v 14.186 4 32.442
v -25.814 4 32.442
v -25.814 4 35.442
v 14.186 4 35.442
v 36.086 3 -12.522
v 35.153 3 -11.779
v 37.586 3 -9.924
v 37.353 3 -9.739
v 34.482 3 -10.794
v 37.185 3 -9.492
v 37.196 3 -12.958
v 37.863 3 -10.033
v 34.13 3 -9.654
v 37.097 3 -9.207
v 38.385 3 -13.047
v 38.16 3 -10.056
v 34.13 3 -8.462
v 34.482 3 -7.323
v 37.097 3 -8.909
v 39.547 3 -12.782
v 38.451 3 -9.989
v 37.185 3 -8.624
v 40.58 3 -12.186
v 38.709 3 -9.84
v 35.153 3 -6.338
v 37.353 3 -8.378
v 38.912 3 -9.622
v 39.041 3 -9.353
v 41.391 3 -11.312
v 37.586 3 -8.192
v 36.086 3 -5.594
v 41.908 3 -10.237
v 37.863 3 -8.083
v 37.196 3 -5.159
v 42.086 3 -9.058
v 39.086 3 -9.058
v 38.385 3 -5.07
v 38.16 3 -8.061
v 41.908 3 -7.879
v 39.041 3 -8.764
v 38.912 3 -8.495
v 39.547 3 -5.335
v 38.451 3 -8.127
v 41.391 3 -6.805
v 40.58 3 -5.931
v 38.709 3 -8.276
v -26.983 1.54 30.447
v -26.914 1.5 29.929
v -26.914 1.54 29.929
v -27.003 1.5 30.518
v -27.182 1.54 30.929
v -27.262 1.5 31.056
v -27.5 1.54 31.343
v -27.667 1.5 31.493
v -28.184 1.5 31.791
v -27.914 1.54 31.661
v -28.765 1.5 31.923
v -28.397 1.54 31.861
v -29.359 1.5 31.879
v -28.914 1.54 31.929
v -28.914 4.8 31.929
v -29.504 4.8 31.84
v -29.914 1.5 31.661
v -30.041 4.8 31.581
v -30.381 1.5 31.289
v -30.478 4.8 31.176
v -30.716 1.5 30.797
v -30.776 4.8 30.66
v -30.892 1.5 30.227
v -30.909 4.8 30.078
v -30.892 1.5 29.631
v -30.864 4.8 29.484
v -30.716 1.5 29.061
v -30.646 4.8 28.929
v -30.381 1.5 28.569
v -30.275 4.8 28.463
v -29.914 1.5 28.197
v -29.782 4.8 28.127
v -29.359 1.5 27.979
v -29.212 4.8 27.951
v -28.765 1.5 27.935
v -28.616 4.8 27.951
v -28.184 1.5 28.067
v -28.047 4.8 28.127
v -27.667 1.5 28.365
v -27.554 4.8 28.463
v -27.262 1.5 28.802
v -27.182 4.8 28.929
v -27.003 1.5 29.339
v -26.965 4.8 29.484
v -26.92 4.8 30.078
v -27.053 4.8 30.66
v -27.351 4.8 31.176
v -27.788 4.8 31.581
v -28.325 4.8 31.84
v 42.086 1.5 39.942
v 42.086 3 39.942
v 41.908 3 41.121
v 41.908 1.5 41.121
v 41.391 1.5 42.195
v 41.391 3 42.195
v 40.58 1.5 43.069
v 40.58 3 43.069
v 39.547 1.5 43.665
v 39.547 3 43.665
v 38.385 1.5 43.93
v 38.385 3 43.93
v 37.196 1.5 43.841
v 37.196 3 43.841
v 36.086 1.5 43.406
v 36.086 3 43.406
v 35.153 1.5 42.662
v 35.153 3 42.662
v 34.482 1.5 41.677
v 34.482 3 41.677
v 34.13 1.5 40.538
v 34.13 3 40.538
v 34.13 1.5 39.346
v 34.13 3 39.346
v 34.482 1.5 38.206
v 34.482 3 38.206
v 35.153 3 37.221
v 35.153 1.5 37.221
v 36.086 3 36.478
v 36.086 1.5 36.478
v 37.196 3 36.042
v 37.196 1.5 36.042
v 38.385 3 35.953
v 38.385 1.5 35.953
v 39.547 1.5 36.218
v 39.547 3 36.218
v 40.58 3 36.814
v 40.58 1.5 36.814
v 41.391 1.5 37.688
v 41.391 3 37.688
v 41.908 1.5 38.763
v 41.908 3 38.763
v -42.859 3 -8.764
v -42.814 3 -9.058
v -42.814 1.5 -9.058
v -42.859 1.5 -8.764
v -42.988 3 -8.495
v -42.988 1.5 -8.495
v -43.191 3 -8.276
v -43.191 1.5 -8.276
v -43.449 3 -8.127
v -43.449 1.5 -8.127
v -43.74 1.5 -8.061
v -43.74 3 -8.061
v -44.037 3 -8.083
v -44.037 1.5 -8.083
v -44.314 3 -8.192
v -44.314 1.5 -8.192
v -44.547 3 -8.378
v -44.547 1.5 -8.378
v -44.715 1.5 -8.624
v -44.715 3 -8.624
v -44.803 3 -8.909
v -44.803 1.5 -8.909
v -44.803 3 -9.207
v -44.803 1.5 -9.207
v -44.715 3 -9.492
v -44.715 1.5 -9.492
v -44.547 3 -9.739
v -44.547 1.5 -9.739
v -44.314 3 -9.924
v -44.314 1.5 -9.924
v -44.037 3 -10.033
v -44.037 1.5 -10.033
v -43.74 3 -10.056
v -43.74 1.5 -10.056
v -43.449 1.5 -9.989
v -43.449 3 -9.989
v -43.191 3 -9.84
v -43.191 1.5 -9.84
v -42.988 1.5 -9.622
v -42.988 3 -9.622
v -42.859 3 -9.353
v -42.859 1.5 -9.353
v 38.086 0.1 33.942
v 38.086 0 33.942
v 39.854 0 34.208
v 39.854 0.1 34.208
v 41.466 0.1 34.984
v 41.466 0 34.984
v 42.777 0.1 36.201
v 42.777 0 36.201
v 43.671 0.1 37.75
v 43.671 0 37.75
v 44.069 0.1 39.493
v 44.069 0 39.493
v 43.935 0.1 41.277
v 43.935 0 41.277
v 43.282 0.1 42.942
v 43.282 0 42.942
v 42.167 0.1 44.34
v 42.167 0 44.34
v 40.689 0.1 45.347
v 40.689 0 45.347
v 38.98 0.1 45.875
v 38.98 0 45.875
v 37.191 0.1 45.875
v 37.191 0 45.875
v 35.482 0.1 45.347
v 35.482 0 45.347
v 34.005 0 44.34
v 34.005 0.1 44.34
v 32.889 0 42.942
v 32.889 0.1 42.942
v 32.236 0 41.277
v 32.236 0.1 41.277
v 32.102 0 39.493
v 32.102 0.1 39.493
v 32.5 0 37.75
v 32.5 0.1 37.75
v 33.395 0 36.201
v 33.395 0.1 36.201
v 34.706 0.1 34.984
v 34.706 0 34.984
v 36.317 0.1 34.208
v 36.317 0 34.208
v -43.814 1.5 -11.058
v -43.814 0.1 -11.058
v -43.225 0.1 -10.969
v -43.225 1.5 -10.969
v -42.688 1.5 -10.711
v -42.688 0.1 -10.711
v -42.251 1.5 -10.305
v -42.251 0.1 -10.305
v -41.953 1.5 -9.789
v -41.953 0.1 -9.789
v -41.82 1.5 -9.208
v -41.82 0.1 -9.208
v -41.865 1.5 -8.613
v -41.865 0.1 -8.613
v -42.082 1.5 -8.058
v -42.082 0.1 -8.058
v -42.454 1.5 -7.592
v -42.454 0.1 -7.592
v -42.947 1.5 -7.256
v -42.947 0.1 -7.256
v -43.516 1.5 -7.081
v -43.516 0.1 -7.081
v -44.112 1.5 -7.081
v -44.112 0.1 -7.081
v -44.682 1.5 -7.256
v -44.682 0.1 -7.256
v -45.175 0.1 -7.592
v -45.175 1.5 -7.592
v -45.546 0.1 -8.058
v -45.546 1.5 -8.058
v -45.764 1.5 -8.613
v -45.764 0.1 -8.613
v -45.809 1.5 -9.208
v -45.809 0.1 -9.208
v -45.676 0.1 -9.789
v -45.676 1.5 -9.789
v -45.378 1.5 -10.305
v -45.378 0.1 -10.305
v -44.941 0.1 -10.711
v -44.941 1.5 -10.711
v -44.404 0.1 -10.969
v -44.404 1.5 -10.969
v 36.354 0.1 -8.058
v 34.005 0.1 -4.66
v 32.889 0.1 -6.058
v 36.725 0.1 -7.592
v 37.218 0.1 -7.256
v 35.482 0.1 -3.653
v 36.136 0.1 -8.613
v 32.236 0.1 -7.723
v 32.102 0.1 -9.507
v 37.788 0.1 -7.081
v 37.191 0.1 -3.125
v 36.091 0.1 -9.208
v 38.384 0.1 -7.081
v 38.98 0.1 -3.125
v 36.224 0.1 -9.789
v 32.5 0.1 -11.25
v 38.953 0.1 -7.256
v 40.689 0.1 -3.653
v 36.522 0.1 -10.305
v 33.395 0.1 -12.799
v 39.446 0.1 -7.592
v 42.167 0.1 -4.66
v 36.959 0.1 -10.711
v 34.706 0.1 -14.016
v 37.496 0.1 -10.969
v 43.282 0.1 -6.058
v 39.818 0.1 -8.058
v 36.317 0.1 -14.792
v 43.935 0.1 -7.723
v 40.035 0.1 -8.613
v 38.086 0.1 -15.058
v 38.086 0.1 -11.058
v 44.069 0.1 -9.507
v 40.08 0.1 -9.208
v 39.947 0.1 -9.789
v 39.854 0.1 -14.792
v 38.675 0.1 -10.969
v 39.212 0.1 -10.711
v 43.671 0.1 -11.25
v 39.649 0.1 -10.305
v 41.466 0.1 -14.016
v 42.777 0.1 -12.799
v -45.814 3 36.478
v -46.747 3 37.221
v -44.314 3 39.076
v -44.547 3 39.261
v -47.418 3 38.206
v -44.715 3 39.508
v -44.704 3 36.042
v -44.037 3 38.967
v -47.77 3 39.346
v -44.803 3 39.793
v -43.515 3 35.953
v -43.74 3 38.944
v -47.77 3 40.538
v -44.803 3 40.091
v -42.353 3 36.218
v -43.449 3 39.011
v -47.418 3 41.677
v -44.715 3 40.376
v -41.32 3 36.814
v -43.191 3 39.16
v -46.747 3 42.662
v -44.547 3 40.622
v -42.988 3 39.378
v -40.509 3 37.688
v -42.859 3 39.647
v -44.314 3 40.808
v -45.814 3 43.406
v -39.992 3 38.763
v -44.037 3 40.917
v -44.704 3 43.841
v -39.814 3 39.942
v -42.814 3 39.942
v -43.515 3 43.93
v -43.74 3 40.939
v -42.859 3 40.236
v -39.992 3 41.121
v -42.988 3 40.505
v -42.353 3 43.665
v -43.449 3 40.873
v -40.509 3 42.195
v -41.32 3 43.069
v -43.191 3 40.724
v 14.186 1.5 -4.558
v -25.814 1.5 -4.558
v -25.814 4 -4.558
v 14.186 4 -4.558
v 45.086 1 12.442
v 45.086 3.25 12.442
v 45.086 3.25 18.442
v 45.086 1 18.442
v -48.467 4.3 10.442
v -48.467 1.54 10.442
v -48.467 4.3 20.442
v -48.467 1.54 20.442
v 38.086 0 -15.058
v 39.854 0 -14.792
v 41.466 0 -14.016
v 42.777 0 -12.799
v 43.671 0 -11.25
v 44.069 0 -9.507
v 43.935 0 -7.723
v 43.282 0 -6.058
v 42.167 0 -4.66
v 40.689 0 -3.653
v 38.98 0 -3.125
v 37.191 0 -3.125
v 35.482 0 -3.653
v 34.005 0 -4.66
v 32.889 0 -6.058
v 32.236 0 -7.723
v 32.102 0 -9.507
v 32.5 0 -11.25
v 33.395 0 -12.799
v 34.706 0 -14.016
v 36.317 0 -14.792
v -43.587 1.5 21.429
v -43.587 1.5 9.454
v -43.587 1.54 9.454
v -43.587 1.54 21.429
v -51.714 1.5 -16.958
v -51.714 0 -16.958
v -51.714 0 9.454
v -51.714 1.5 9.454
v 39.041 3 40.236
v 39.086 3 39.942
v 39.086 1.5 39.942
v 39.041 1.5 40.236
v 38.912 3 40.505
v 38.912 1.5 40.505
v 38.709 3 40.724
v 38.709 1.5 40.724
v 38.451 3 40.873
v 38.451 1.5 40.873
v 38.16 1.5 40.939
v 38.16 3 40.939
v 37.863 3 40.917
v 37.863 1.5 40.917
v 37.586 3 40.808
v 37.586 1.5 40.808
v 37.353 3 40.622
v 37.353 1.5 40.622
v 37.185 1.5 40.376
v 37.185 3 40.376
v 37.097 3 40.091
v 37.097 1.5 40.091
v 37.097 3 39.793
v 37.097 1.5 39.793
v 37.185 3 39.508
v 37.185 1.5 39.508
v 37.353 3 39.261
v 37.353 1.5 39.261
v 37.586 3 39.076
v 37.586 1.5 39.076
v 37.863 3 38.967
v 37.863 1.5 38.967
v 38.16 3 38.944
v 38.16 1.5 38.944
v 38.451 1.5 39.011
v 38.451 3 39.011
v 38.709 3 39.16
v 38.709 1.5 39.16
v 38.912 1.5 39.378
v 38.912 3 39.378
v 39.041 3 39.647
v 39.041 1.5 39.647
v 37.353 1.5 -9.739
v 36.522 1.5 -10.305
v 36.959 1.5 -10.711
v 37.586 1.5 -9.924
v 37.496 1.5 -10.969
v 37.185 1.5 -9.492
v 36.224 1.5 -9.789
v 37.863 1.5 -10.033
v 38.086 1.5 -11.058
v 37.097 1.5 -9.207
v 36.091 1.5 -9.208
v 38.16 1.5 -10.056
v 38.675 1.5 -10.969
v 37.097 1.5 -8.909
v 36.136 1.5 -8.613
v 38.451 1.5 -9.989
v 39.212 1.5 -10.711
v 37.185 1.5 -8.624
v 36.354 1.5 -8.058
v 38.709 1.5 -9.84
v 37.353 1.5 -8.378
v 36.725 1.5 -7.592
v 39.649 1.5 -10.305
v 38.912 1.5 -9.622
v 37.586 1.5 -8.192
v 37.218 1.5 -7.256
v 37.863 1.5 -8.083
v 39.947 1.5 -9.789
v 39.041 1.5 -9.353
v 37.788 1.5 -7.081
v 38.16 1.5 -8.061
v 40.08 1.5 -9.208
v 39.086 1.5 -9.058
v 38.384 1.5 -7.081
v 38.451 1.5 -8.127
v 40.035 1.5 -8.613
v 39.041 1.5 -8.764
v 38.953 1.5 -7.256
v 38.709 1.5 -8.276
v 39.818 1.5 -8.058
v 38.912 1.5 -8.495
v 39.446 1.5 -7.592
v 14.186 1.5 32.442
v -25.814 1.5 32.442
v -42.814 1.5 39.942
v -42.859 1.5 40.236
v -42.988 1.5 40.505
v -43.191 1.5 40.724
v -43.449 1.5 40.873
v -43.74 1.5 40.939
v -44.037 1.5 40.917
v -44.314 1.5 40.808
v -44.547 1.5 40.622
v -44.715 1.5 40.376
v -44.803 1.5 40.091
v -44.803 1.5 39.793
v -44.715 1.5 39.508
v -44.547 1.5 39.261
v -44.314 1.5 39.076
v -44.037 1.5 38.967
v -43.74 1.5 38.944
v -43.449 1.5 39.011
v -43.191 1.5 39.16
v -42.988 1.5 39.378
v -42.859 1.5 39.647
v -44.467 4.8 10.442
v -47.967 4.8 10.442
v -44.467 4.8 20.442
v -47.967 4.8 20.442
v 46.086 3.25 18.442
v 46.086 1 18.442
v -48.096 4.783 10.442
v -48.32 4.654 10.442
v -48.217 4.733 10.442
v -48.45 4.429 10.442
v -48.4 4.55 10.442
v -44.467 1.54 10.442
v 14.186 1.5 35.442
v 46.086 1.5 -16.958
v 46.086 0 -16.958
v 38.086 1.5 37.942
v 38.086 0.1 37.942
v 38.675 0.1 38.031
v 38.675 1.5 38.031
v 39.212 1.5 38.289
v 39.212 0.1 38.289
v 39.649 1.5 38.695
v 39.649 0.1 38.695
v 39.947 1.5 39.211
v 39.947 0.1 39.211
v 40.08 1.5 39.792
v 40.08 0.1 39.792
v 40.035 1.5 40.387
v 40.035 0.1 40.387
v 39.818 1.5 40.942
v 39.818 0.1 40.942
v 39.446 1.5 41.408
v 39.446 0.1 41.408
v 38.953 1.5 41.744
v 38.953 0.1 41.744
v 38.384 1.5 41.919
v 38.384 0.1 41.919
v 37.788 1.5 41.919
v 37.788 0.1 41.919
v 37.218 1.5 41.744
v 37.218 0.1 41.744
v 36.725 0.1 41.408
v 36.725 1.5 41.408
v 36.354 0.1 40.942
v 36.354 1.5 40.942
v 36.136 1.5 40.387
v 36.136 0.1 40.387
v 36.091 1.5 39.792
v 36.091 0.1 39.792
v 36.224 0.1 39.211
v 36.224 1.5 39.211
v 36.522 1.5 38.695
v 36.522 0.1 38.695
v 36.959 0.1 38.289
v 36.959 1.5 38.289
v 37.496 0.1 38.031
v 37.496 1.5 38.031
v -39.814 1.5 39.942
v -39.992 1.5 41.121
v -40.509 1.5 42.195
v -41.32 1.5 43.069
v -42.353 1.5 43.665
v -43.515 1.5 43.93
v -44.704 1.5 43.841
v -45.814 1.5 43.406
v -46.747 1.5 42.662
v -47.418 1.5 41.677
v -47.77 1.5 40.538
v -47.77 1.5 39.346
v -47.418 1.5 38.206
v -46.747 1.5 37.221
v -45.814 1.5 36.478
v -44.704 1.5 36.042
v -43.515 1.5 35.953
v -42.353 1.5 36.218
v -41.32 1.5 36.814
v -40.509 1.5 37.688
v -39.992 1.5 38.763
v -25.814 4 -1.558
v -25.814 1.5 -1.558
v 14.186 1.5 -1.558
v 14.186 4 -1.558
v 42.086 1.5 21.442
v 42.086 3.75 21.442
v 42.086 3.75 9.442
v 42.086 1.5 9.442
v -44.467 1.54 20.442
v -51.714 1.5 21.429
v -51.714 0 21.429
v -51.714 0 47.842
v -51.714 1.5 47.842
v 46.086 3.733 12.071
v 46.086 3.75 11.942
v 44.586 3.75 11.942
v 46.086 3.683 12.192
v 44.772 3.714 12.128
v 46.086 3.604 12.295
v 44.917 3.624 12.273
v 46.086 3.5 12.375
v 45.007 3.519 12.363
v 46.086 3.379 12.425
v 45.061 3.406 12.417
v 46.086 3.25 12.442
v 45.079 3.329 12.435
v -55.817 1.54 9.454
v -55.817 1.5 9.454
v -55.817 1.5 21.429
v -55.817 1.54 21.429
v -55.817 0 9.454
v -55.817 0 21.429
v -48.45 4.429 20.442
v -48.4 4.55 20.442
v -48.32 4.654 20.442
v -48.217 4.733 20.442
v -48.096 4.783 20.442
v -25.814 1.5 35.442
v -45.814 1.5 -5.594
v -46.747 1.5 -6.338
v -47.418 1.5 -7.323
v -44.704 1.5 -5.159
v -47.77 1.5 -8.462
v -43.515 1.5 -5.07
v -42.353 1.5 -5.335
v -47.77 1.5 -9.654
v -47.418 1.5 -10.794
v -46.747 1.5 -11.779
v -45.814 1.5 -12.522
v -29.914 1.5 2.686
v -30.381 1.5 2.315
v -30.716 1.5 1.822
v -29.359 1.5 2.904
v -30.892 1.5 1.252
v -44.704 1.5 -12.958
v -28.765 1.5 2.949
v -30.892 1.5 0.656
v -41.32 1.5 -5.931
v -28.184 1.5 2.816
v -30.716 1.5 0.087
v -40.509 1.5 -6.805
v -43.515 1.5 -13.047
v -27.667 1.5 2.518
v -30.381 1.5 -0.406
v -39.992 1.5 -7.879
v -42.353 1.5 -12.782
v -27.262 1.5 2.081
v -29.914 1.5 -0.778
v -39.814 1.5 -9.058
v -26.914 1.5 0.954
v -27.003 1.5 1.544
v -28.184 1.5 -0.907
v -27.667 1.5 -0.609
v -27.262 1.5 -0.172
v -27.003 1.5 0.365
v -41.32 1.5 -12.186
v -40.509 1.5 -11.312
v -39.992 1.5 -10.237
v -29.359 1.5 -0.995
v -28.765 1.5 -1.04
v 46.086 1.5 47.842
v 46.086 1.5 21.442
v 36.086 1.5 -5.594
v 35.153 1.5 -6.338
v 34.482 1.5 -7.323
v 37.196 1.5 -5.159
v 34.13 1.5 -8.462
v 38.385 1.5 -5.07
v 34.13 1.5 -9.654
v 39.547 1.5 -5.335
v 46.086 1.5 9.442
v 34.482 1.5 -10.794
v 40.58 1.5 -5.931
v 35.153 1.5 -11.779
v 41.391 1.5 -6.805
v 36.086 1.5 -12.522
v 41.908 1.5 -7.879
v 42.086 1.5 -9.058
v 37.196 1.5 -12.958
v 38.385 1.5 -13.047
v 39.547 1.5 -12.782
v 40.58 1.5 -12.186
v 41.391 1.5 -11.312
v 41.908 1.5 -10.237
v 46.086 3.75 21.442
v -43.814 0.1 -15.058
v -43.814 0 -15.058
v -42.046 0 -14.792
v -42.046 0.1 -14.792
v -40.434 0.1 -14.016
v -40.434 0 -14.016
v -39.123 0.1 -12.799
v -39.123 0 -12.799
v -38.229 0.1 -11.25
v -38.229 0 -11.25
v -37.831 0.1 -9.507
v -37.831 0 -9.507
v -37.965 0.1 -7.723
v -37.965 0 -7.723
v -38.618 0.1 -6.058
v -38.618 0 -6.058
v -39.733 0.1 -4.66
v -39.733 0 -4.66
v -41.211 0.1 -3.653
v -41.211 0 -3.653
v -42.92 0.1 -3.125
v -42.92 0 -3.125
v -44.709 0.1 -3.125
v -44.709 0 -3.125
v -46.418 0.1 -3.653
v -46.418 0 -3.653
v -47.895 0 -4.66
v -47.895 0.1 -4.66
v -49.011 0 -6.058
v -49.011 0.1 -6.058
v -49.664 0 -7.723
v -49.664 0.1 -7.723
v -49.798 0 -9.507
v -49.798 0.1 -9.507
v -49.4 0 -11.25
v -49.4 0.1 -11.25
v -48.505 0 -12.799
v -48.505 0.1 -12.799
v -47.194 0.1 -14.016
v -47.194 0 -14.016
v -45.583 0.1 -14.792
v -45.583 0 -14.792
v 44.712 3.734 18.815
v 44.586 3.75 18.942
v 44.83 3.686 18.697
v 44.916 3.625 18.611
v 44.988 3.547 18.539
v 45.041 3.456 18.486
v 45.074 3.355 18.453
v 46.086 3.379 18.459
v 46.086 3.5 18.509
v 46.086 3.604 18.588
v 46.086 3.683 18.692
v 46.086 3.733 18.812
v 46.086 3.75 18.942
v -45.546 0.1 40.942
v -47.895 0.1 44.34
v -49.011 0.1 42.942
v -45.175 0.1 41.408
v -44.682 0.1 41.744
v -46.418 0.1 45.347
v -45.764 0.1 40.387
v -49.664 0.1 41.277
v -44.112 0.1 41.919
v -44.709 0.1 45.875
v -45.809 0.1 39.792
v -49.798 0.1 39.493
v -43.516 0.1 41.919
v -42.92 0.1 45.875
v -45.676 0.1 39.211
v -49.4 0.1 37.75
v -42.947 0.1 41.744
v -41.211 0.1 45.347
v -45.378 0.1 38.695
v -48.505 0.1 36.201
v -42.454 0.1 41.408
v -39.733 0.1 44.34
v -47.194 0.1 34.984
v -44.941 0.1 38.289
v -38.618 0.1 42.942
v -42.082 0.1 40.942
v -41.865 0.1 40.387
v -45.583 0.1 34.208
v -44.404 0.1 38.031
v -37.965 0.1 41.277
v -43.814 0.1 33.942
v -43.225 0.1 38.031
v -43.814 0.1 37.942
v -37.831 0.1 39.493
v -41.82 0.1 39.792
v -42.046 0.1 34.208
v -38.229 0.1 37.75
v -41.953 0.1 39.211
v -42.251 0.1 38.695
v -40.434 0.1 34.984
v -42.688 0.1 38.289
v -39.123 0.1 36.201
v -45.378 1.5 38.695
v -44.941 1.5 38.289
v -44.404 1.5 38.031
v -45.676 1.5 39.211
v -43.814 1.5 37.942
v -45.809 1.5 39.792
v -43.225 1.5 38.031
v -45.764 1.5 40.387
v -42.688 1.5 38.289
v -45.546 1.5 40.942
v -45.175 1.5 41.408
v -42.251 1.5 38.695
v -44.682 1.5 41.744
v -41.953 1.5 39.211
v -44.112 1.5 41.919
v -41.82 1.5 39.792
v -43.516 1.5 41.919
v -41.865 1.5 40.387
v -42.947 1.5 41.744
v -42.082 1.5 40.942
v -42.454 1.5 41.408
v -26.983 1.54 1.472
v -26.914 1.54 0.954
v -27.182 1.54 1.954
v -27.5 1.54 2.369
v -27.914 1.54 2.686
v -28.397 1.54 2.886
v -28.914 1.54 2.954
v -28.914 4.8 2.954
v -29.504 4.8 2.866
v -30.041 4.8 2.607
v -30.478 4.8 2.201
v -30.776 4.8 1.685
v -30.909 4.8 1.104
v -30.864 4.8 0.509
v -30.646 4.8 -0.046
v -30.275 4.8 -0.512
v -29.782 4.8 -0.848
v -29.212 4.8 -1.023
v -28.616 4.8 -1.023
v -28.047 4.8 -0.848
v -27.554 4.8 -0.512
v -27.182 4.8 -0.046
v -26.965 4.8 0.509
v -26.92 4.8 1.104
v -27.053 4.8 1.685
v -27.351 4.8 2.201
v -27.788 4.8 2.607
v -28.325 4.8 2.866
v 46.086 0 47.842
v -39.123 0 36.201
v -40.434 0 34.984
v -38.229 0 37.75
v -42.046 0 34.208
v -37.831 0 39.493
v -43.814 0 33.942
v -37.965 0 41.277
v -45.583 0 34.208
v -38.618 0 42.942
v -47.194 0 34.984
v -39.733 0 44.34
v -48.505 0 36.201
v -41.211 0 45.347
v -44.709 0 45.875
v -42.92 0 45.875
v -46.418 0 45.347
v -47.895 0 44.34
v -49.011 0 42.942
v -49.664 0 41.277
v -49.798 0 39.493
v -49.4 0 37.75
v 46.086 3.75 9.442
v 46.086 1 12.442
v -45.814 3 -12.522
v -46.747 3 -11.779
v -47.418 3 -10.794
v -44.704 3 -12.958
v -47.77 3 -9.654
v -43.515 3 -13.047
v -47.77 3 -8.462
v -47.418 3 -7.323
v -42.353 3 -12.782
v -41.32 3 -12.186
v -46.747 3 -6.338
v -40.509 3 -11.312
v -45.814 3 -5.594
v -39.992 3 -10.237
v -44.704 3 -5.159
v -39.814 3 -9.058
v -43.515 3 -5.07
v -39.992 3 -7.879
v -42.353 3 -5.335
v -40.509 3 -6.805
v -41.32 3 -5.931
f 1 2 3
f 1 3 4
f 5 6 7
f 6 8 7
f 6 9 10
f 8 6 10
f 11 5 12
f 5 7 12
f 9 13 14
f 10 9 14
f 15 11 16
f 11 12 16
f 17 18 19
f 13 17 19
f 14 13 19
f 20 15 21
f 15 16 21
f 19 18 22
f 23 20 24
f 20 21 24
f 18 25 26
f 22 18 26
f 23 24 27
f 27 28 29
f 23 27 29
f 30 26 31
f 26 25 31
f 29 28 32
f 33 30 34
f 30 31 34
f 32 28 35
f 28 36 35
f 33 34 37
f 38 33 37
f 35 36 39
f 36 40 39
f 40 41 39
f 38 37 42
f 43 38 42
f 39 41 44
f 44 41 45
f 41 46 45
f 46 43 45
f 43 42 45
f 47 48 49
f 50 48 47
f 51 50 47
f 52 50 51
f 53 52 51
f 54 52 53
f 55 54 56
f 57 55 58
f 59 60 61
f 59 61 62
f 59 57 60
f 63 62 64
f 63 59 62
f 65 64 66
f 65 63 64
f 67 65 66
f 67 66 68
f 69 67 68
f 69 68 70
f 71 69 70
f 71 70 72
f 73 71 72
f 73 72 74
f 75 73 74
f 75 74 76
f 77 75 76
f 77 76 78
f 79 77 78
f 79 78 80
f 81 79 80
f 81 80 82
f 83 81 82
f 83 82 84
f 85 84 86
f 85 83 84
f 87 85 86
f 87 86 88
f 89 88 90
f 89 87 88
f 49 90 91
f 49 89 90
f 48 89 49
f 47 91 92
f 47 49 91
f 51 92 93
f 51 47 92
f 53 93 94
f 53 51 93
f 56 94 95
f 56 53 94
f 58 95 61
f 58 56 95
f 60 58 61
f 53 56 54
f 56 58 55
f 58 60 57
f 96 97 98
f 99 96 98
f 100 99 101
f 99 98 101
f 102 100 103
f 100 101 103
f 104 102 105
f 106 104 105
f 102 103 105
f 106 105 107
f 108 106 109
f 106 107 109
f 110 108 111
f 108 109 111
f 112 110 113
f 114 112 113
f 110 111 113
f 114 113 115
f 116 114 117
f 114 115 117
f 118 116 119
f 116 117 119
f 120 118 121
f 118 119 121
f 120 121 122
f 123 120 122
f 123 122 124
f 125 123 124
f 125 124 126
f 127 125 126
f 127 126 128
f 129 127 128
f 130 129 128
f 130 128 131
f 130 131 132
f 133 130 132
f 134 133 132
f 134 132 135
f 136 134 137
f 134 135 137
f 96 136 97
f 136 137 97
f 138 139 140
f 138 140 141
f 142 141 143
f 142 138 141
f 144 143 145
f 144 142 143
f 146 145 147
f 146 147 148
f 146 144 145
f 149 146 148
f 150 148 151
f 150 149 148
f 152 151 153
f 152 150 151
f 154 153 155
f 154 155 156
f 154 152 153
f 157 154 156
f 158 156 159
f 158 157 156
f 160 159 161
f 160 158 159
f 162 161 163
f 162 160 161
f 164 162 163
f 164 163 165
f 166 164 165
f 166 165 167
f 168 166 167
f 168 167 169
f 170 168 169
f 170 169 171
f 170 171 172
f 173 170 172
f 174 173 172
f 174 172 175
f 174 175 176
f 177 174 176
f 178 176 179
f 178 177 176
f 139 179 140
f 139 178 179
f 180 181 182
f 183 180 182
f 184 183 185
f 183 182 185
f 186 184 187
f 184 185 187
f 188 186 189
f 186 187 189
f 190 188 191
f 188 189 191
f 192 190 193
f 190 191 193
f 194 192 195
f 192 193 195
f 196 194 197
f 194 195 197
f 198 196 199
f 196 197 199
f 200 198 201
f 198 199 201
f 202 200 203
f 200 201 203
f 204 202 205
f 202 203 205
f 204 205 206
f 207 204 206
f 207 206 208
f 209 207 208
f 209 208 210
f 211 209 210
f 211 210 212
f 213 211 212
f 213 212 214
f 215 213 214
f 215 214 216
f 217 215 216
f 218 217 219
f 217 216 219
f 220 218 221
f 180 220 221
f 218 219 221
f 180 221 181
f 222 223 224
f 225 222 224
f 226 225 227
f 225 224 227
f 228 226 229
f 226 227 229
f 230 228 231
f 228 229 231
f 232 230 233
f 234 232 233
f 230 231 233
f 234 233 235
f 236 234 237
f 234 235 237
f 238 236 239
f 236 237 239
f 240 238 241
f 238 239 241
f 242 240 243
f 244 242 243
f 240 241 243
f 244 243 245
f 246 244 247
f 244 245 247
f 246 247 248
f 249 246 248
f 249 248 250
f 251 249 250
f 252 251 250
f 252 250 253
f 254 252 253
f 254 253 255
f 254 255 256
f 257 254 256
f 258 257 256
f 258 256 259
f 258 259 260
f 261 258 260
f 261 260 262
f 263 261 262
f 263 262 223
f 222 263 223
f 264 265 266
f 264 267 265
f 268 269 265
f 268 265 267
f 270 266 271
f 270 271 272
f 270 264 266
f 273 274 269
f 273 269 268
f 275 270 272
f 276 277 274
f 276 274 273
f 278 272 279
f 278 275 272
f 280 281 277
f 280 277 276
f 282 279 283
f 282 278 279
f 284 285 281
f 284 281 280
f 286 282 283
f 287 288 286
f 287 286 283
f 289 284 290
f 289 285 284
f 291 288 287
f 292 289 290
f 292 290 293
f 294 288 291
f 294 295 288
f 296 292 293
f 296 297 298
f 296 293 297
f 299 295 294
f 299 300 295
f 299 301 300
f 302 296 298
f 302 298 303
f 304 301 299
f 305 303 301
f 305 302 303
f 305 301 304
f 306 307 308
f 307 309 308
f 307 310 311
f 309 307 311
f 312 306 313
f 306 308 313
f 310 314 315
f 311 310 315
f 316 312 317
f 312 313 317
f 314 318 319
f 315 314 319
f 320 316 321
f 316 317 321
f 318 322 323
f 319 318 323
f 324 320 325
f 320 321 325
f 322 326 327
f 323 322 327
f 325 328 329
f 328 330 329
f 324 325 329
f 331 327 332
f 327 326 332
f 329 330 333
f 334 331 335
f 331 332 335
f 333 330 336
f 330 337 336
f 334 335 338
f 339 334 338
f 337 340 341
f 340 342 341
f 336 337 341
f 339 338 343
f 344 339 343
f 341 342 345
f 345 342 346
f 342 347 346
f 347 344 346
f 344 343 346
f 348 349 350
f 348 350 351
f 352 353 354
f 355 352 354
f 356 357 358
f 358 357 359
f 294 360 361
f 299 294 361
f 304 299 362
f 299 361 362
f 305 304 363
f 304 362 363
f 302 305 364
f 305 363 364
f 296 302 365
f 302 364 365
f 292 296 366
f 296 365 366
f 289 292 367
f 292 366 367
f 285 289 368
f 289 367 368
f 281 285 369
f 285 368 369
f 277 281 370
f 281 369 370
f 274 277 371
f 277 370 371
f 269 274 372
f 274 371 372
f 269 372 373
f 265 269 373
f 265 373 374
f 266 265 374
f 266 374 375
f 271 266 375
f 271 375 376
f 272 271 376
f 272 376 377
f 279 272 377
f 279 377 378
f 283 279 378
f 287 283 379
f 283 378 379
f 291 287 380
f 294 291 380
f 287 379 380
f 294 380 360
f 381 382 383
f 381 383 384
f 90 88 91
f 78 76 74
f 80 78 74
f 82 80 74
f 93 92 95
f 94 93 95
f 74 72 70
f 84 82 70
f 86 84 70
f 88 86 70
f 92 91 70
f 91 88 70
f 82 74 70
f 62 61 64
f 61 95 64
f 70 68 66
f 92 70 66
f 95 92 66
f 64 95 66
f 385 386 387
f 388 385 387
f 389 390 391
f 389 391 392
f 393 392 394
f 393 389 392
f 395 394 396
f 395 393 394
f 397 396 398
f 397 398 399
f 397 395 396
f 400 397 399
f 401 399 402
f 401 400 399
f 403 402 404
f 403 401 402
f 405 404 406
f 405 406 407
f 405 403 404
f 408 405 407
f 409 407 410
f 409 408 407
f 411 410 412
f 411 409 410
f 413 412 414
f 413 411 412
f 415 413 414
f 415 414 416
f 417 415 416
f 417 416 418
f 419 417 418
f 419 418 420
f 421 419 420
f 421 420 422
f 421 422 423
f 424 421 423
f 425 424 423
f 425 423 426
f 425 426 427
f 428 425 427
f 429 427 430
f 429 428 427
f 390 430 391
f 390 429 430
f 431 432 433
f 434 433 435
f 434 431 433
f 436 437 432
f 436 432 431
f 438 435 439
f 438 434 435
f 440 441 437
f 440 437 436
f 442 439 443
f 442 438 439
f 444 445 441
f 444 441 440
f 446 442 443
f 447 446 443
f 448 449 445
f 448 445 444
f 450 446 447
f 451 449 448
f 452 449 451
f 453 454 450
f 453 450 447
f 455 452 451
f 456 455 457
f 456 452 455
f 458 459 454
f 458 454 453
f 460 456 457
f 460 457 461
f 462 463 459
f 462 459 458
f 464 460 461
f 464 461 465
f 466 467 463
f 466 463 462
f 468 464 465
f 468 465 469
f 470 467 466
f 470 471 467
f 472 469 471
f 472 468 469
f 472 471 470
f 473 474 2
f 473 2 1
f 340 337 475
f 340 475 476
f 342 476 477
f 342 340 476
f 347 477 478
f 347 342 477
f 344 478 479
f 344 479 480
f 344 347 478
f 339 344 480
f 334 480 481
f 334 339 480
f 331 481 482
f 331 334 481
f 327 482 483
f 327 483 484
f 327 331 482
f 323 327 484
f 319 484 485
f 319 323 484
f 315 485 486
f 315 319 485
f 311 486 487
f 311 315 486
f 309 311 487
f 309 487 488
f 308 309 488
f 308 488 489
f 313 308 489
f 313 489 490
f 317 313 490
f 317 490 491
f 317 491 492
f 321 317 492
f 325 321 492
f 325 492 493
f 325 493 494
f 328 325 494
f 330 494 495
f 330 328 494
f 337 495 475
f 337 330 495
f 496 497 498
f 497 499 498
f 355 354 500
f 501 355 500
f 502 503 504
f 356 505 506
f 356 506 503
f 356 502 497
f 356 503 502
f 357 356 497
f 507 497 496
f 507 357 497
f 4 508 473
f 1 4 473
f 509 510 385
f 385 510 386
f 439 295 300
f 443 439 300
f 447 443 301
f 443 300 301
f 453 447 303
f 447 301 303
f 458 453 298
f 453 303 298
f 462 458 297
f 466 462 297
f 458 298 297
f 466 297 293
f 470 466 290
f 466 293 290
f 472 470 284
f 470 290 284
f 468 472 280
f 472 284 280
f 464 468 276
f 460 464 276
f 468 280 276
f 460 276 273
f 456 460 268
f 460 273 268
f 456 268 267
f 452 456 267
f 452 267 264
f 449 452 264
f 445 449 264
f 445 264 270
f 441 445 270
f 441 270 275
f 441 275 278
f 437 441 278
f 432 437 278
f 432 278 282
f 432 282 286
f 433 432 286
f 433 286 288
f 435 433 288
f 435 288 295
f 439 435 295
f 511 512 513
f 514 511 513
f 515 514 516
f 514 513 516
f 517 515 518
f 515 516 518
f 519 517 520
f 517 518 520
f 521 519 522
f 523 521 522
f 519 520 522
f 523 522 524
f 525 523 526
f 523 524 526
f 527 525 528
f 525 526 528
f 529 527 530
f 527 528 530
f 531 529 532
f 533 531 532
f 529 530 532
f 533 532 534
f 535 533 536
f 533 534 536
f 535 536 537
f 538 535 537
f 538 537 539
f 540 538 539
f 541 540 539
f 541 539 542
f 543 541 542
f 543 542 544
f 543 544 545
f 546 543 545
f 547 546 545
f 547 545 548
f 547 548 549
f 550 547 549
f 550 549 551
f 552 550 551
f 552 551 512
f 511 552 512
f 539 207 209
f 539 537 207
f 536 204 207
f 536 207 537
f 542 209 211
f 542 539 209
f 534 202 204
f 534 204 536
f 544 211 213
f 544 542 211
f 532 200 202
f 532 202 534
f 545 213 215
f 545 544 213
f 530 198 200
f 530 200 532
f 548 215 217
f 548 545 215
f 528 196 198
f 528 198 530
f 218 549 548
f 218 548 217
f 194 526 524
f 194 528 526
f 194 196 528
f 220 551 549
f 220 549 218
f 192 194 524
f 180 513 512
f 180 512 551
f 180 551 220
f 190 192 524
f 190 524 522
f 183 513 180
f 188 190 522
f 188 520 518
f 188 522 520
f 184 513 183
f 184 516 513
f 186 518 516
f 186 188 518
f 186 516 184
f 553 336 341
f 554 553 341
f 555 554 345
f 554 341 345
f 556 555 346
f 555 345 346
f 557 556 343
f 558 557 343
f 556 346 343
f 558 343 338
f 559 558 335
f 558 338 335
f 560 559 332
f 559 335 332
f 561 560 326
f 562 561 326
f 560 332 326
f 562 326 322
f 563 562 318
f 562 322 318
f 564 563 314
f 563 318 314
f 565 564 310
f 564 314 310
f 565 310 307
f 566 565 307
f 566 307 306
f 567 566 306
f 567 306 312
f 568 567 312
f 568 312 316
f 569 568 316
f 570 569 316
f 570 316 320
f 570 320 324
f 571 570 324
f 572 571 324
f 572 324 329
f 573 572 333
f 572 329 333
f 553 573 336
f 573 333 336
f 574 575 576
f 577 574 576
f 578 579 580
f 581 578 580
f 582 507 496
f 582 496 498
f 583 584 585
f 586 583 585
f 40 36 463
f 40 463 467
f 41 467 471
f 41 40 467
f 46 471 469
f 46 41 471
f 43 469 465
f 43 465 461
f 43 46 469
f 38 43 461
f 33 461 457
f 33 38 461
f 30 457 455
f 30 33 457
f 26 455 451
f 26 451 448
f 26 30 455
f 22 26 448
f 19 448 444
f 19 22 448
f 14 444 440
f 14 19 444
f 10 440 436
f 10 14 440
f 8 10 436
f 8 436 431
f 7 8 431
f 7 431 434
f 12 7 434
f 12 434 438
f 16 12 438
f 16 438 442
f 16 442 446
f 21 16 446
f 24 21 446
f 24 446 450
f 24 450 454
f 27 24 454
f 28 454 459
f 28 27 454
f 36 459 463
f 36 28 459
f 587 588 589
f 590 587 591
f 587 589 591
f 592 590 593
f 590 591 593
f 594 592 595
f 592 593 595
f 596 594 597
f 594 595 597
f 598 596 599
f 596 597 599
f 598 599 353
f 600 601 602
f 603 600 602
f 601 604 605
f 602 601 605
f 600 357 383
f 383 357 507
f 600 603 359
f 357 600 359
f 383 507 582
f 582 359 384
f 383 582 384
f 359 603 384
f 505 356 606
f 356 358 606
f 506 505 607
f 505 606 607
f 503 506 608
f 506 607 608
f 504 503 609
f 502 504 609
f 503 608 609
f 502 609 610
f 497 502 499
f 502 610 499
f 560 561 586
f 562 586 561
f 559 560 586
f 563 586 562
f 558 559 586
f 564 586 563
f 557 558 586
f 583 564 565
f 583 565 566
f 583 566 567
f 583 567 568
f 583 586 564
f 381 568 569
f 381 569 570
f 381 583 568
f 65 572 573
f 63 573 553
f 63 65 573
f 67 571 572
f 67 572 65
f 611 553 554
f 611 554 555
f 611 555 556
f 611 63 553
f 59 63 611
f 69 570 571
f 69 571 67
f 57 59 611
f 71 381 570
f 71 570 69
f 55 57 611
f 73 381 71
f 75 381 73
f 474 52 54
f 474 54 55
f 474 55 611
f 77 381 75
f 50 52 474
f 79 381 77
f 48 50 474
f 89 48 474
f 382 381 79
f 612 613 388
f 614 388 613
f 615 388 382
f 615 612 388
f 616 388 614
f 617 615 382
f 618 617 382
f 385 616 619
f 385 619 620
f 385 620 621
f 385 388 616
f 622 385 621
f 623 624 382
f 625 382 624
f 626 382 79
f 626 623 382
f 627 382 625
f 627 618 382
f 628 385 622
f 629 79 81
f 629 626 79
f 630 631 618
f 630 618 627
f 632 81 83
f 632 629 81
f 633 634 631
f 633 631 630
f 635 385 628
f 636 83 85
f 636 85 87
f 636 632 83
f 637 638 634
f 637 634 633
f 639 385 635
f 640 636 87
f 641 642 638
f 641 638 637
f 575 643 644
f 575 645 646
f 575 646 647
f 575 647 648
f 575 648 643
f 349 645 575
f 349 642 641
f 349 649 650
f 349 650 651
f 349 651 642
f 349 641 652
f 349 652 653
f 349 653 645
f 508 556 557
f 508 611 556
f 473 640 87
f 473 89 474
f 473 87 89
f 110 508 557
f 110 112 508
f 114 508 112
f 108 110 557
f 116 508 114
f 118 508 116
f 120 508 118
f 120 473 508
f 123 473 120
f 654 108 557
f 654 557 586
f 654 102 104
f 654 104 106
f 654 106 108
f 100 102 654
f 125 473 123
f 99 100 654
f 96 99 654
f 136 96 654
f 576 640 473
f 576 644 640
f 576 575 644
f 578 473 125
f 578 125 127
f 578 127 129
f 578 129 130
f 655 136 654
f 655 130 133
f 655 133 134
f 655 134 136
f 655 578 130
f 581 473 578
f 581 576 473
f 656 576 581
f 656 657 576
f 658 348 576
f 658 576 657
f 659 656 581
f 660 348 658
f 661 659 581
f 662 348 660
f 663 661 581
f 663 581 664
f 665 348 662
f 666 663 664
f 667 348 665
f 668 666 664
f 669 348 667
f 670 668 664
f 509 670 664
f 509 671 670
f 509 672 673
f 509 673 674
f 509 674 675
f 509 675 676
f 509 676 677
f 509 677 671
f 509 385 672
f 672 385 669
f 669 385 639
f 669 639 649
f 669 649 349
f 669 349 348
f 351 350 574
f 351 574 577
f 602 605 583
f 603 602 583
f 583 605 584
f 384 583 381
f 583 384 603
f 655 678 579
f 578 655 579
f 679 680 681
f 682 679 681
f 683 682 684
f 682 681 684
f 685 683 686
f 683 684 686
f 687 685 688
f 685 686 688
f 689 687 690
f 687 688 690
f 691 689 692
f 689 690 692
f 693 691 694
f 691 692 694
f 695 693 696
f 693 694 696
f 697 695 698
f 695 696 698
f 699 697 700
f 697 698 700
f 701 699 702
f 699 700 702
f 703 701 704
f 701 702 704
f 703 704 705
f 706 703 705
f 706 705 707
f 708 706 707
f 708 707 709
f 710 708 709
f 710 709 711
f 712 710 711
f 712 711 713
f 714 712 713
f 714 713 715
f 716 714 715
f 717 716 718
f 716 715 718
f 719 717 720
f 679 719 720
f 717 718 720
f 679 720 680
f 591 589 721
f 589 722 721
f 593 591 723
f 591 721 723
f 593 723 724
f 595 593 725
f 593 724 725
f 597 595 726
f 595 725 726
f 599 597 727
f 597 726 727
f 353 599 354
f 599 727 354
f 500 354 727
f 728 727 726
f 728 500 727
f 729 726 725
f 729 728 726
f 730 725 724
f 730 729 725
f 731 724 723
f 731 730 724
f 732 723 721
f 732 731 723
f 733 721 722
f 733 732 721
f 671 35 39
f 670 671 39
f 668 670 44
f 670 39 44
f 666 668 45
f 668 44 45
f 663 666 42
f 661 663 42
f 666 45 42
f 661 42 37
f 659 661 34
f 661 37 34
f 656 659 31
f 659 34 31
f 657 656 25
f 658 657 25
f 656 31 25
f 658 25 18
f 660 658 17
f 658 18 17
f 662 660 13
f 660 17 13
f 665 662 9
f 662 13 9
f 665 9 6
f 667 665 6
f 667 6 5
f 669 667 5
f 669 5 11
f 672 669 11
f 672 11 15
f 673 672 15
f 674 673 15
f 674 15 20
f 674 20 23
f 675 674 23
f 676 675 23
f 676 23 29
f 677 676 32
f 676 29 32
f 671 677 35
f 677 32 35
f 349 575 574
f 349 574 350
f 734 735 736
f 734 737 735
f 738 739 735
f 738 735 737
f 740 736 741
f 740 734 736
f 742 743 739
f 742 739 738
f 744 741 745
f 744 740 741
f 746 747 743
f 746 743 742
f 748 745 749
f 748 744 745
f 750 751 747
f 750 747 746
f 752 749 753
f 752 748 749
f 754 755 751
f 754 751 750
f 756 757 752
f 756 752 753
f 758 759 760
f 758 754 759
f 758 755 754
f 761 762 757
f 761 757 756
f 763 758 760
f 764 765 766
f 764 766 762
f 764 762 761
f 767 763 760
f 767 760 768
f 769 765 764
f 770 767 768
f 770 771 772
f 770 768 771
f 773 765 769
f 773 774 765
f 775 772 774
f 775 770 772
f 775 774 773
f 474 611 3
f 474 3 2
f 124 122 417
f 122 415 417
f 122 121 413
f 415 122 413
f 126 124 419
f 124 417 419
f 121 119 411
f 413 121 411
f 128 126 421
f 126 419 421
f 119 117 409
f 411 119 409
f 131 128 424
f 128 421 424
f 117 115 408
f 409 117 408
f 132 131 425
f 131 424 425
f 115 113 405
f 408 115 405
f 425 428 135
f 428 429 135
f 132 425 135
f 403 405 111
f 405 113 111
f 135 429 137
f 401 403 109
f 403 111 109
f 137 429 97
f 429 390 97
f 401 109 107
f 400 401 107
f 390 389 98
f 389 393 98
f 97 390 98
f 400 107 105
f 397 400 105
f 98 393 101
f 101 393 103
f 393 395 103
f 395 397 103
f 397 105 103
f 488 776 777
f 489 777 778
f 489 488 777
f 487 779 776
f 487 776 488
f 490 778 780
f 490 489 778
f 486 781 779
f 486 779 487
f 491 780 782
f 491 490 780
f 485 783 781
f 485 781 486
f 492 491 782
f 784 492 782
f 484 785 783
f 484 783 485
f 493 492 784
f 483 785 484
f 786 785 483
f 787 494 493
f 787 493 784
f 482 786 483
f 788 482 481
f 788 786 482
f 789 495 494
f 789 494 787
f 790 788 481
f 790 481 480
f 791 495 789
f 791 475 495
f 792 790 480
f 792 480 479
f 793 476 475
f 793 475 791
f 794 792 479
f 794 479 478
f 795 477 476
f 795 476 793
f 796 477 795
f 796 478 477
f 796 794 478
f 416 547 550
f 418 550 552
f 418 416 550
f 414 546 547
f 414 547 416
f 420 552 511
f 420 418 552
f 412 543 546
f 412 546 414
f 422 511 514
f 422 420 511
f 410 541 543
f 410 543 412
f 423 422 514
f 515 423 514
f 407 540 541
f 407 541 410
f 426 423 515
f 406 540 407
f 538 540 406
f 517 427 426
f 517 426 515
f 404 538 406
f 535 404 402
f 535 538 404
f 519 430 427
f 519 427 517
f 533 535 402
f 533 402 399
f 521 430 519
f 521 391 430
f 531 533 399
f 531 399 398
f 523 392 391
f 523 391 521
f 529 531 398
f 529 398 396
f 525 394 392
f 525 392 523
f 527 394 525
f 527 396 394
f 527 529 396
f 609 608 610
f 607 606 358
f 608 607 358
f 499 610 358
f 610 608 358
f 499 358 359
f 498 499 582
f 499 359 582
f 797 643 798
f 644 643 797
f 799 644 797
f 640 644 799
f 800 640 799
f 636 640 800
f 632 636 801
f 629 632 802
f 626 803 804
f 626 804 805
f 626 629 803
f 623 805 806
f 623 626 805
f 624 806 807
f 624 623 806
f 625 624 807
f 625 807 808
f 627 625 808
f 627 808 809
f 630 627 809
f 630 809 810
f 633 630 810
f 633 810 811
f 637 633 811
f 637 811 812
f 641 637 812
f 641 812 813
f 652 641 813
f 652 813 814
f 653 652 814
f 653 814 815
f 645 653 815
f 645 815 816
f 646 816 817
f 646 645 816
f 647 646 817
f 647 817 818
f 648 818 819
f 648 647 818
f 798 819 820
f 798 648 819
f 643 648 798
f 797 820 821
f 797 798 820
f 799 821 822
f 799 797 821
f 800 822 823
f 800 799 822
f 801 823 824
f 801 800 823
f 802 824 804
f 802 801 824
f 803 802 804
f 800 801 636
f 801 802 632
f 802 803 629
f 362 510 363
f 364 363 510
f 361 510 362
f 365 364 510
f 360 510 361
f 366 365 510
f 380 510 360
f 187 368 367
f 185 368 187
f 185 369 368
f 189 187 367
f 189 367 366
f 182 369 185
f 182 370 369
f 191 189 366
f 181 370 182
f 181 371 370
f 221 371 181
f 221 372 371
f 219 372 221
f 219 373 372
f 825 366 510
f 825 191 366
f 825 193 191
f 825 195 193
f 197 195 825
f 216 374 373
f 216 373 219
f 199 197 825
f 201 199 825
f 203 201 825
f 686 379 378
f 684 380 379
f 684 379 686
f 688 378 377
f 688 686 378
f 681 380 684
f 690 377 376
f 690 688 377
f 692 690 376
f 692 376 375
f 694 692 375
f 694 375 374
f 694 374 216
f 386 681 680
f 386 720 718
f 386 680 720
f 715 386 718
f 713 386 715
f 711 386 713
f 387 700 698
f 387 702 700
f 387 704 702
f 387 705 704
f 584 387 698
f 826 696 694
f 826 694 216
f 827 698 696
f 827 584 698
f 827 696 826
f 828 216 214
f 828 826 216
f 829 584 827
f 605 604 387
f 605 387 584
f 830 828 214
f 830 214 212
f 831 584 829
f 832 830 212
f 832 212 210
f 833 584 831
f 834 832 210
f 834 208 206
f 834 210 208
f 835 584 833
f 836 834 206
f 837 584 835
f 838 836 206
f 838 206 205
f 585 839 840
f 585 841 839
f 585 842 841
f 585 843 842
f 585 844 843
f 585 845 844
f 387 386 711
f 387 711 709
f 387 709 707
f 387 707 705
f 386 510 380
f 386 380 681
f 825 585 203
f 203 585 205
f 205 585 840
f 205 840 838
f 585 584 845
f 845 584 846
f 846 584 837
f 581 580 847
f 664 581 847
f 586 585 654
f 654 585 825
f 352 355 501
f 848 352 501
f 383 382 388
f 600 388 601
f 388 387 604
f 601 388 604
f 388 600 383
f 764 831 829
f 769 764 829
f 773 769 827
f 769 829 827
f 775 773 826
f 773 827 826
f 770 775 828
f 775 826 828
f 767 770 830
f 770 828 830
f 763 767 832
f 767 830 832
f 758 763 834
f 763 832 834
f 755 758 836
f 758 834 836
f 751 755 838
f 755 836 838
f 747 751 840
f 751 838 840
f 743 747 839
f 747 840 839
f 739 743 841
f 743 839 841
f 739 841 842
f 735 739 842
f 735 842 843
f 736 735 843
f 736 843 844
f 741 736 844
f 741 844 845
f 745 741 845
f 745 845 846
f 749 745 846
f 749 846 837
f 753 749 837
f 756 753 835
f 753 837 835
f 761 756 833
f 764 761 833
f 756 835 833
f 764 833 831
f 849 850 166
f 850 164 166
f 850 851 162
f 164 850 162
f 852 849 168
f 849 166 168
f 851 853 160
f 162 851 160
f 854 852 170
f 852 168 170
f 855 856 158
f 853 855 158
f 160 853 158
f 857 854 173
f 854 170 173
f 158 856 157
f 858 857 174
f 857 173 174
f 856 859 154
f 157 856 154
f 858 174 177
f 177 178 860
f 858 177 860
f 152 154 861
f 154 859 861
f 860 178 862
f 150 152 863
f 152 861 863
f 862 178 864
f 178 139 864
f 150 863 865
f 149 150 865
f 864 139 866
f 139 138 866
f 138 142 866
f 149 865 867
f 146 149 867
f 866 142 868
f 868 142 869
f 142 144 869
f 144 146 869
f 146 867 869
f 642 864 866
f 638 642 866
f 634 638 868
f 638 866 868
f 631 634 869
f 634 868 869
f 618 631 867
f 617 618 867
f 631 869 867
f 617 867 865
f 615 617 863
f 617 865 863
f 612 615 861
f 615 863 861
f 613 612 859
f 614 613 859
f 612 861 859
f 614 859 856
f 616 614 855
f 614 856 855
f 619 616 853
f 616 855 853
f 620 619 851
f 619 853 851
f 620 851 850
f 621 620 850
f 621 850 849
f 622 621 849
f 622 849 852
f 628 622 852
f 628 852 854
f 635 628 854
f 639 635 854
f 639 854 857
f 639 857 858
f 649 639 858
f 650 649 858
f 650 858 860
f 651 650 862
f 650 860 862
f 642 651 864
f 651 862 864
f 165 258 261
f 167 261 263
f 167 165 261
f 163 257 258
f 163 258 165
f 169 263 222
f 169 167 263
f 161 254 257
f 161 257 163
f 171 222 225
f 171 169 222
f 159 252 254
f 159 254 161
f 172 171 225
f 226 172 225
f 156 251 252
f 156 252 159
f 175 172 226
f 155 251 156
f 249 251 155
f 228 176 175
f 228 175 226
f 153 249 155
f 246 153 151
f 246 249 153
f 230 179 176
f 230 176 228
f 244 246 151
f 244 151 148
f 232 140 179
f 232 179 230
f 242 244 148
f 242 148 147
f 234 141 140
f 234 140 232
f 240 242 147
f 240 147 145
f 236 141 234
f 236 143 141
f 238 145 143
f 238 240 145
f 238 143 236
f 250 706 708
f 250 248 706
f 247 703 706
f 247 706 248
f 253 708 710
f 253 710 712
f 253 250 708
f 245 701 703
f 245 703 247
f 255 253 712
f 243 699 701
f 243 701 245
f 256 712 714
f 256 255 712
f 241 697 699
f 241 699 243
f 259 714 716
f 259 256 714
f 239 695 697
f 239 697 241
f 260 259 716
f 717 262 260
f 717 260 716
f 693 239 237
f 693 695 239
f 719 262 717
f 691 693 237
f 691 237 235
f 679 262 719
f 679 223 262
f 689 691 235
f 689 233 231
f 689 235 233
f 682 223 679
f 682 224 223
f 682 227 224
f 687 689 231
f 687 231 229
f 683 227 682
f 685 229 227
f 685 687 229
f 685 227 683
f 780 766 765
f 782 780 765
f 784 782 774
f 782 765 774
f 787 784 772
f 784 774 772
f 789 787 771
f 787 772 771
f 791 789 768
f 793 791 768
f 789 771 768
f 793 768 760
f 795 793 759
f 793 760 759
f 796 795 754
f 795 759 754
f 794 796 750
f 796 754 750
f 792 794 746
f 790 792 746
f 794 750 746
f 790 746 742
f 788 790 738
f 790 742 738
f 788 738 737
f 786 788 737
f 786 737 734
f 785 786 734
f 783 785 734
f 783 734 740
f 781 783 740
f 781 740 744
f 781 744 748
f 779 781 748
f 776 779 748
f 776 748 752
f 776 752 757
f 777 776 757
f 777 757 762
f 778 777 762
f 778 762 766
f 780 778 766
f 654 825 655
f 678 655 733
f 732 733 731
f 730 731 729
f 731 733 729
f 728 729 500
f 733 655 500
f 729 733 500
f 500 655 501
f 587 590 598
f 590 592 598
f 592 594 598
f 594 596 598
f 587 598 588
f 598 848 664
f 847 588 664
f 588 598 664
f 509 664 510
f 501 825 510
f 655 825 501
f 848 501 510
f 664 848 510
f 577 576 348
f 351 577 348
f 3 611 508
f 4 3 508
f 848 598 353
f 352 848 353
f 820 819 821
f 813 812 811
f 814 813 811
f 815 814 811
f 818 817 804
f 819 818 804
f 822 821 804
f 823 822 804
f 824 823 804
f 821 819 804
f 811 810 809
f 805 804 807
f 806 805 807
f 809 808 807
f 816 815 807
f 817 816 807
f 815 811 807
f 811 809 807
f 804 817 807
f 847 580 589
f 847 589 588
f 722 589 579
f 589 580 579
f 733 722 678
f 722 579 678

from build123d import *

# Parameters (mm, degrees)
EXTRUDE_1_DEPTH       = 1.5
SKETCH_2_R            = 6
CUT_EXTRUDE_1_DEPTH   = 0.1
SKETCH_11_R           = 2
SKETCH_11_W           = 12.230000073
SKETCH_11_H           = 11.974599949
EXTRUDE_5_DEPTH       = 1.539974634
SKETCH_13_R           = 2
SKETCH_13_W           = 4
SKETCH_13_H           = 10
TYPEC_2_DEPTH         = 4.7999746
LED_3_START           = -3.75
LED_3_DEPTH           = 2.25
LED_1_R               = 0.5
CUT_EXTRUDE_2_REACH   = 75.671
SKETCH_15_R           = 2
EXTRUDE_START         = -3
SKETCH_16_R           = 4
SKETCH_16_R_2         = 1
EXTRUDE_4_DEPTH       = 1.5
CUT_EXTRUDE_START     = -1.5
SKETCH_17_W           = 1
SKETCH_17_H           = 6
CUT_EXTRUDE_2_2_DEPTH = 0.5
SKETCH_18_W           = 40
SKETCH_18_H           = 3
EXTRUDE_2_DEPTH       = 2.5


with BuildPart() as part:
    # 草图1 → 凸台-拉伸1 (new body)
    with BuildSketch(Plane(origin=(0, 0, 0), x_dir=(1, 0, 0), z_dir=(0, 1, 0))):
        Polygon((-51.714401712, -9.454370264), (-55.816720774, -9.454370264), (-55.816720774, -21.428970213), (-51.714401712, -21.428970213), (-51.714401712, -47.841670238), (46.085598288, -47.841670238), (46.085598288, 16.958329762), (-51.714401712, 16.958329762), align=None)
    extrude(amount=EXTRUDE_1_DEPTH)

    # 草图2 → 切除-拉伸1 (cut)
    with BuildSketch(Plane.XZ):
        with Locations(Location((-43.814401712, -9.058329762, 0), (0, 0, 270))):
            Circle(SKETCH_2_R)
        with Locations(Location((-43.814401712, 39.941670238, 0), (0, 0, 270))):
            Circle(SKETCH_2_R)
        with Locations(Location((38.085598288, -9.058329762, 0), (0, 0, 270))):
            Circle(SKETCH_2_R)
        with Locations(Location((38.085598288, 39.941670238, 0), (0, 0, 270))):
            Circle(SKETCH_2_R)
    extrude(amount=-CUT_EXTRUDE_1_DEPTH, mode=Mode.SUBTRACT)

    # 草图11 → 充电板档板凸台-拉伸5 (add)
    with BuildSketch(Plane.XZ):
        with Locations((-28.914401712, 29.928970213)):
            Circle(SKETCH_11_R)
        with Locations((-28.914401712, 0.954370264)):
            Circle(SKETCH_11_R)
        with Locations((-49.701720738, 15.441670239)):
            Rectangle(SKETCH_11_W, SKETCH_11_H)
    extrude(amount=-EXTRUDE_5_DEPTH)

    # 草图13 → TypeC支撑凸台-拉伸2 (add)
    with BuildSketch(Plane.XZ):
        with Locations(Location((-28.914401712, 29.928970213, 0), (0, 0, 90))):
            Circle(SKETCH_13_R)
        with Locations(Location((-28.914401712, 0.954370264, 0), (0, 0, 90))):
            Circle(SKETCH_13_R)
        with Locations((-46.466720701, 15.441670238)):
            Rectangle(SKETCH_13_W, SKETCH_13_H)
    extrude(amount=-TYPEC_2_DEPTH)

    # 草图14 → LED限位凸台-拉伸3 (add)
    with BuildSketch(Plane.XZ.offset(LED_3_START)):
        Polygon((45.085598288, 12.441670238), (45.085598288, 18.441670238), (46.085598288, 18.441670238), (46.085598288, 21.441670238), (42.085598288, 21.441670238), (42.085598288, 9.441670238), (46.085598288, 9.441670238), (46.085598288, 12.441670238), align=None)
    extrude(amount=LED_3_DEPTH)

    # LED限位圆角1
    led_1_edges = [part.edges().sort_by_distance(p)[0] for p in [
        (45.585598288, 3.75, 18.441670238),
        (45.585598288, 3.75, 12.441670238),
        (45.085598288, 3.75, 15.441670238),
        (-48.466720701, 4.7999746, 15.441670238),
    ]]
    fillet(led_1_edges, radius=LED_1_R)

    # 草图15 → Cut-Extrude 2 (cut, up to next)
    with BuildSketch(Plane.XZ, mode=Mode.PRIVATE) as cut_extrude_2_sk1:
        with Locations(Location((-43.814401712, -9.058329762, 0), (0, 0, 270))):
            Circle(SKETCH_15_R)
    cut_extrude_2_tool1 = extrude(cut_extrude_2_sk1.sketch, amount=-CUT_EXTRUDE_2_REACH, mode=Mode.PRIVATE) & part.part
    # 草图15 → Cut-Extrude 2 (cut, up to next)
    with BuildSketch(Plane.XZ, mode=Mode.PRIVATE) as cut_extrude_2_sk2:
        with Locations(Location((-43.814401712, 39.941670238, 0), (0, 0, 270))):
            Circle(SKETCH_15_R)
    cut_extrude_2_tool2 = extrude(cut_extrude_2_sk2.sketch, amount=-CUT_EXTRUDE_2_REACH, mode=Mode.PRIVATE) & part.part
    # 草图15 → Cut-Extrude 2 (cut, up to next)
    with BuildSketch(Plane.XZ, mode=Mode.PRIVATE) as cut_extrude_2_sk3:
        with Locations(Location((38.085598288, 39.941670238, 0), (0, 0, 270))):
            Circle(SKETCH_15_R)
    cut_extrude_2_tool3 = extrude(cut_extrude_2_sk3.sketch, amount=-CUT_EXTRUDE_2_REACH, mode=Mode.PRIVATE) & part.part
    # 草图15 → Cut-Extrude 2 (cut, up to next)
    with BuildSketch(Plane.XZ, mode=Mode.PRIVATE) as cut_extrude_2_sk4:
        with Locations(Location((38.085598288, -9.058329762, 0), (0, 0, 270))):
            Circle(SKETCH_15_R)
    cut_extrude_2_tool4 = extrude(cut_extrude_2_sk4.sketch, amount=-CUT_EXTRUDE_2_REACH, mode=Mode.PRIVATE) & part.part
    add(cut_extrude_2_tool1.solids().sort_by_distance((-43.814402, 0, -9.05833))[0], mode=Mode.SUBTRACT)
    add(cut_extrude_2_tool2.solids().sort_by_distance((-43.814402, 0, 39.94167))[0], mode=Mode.SUBTRACT)
    add(cut_extrude_2_tool3.solids().sort_by_distance((38.085598, 0, 39.94167))[0], mode=Mode.SUBTRACT)
    add(cut_extrude_2_tool4.solids().sort_by_distance((38.085598, 0, -9.05833))[0], mode=Mode.SUBTRACT)

    # 草图16 → 螺丝孔凸台-拉伸4 (add)
    # profile 1 of 4: a face of its own
    with BuildSketch(Plane.XZ.offset(EXTRUDE_START)):
        with Locations((38.085598288, 39.941670238)):
            Circle(SKETCH_16_R)
        with Locations((38.085598288, 39.941670238)):
            Circle(SKETCH_16_R_2, mode=Mode.SUBTRACT)
    # profile 2 of 4: a face of its own
    with BuildSketch(Plane.XZ.offset(EXTRUDE_START)):
        with Locations((38.085598288, -9.058329762)):
            Circle(SKETCH_16_R)
        with Locations((38.085598288, -9.058329762)):
            Circle(SKETCH_16_R_2, mode=Mode.SUBTRACT)
    # profile 3 of 4: a face of its own
    with BuildSketch(Plane.XZ.offset(EXTRUDE_START)):
        with Locations((-43.814401712, -9.058329762)):
            Circle(SKETCH_16_R)
        with Locations((-43.814401712, -9.058329762)):
            Circle(SKETCH_16_R_2, mode=Mode.SUBTRACT)
    # profile 4 of 4: a face of its own
    with BuildSketch(Plane.XZ.offset(EXTRUDE_START)):
        with Locations((-43.814401712, 39.941670238)):
            Circle(SKETCH_16_R)
        with Locations((-43.814401712, 39.941670238)):
            Circle(SKETCH_16_R_2, mode=Mode.SUBTRACT)
    extrude(amount=EXTRUDE_4_DEPTH)

    # 草图17 → Cut-Extrude 2 2 (cut)
    with BuildSketch(Plane.XZ.offset(CUT_EXTRUDE_START)):
        with Locations((45.585598288, 15.441670238)):
            Rectangle(SKETCH_17_W, SKETCH_17_H)
    extrude(amount=CUT_EXTRUDE_2_2_DEPTH, mode=Mode.SUBTRACT)

    # 草图18 → 凸台-拉伸2 (add)
    with BuildSketch(Plane(origin=(0, 1.5, 0), x_dir=(1, 0, 0), z_dir=(0, 1, 0))):
        with Locations((-5.814401712, 3.058329762)):
            Rectangle(SKETCH_18_W, SKETCH_18_H)
        with Locations((-5.814401712, -33.941670238)):
            Rectangle(SKETCH_18_W, SKETCH_18_H)
    extrude(amount=EXTRUDE_2_DEPTH)


solid = part.part
